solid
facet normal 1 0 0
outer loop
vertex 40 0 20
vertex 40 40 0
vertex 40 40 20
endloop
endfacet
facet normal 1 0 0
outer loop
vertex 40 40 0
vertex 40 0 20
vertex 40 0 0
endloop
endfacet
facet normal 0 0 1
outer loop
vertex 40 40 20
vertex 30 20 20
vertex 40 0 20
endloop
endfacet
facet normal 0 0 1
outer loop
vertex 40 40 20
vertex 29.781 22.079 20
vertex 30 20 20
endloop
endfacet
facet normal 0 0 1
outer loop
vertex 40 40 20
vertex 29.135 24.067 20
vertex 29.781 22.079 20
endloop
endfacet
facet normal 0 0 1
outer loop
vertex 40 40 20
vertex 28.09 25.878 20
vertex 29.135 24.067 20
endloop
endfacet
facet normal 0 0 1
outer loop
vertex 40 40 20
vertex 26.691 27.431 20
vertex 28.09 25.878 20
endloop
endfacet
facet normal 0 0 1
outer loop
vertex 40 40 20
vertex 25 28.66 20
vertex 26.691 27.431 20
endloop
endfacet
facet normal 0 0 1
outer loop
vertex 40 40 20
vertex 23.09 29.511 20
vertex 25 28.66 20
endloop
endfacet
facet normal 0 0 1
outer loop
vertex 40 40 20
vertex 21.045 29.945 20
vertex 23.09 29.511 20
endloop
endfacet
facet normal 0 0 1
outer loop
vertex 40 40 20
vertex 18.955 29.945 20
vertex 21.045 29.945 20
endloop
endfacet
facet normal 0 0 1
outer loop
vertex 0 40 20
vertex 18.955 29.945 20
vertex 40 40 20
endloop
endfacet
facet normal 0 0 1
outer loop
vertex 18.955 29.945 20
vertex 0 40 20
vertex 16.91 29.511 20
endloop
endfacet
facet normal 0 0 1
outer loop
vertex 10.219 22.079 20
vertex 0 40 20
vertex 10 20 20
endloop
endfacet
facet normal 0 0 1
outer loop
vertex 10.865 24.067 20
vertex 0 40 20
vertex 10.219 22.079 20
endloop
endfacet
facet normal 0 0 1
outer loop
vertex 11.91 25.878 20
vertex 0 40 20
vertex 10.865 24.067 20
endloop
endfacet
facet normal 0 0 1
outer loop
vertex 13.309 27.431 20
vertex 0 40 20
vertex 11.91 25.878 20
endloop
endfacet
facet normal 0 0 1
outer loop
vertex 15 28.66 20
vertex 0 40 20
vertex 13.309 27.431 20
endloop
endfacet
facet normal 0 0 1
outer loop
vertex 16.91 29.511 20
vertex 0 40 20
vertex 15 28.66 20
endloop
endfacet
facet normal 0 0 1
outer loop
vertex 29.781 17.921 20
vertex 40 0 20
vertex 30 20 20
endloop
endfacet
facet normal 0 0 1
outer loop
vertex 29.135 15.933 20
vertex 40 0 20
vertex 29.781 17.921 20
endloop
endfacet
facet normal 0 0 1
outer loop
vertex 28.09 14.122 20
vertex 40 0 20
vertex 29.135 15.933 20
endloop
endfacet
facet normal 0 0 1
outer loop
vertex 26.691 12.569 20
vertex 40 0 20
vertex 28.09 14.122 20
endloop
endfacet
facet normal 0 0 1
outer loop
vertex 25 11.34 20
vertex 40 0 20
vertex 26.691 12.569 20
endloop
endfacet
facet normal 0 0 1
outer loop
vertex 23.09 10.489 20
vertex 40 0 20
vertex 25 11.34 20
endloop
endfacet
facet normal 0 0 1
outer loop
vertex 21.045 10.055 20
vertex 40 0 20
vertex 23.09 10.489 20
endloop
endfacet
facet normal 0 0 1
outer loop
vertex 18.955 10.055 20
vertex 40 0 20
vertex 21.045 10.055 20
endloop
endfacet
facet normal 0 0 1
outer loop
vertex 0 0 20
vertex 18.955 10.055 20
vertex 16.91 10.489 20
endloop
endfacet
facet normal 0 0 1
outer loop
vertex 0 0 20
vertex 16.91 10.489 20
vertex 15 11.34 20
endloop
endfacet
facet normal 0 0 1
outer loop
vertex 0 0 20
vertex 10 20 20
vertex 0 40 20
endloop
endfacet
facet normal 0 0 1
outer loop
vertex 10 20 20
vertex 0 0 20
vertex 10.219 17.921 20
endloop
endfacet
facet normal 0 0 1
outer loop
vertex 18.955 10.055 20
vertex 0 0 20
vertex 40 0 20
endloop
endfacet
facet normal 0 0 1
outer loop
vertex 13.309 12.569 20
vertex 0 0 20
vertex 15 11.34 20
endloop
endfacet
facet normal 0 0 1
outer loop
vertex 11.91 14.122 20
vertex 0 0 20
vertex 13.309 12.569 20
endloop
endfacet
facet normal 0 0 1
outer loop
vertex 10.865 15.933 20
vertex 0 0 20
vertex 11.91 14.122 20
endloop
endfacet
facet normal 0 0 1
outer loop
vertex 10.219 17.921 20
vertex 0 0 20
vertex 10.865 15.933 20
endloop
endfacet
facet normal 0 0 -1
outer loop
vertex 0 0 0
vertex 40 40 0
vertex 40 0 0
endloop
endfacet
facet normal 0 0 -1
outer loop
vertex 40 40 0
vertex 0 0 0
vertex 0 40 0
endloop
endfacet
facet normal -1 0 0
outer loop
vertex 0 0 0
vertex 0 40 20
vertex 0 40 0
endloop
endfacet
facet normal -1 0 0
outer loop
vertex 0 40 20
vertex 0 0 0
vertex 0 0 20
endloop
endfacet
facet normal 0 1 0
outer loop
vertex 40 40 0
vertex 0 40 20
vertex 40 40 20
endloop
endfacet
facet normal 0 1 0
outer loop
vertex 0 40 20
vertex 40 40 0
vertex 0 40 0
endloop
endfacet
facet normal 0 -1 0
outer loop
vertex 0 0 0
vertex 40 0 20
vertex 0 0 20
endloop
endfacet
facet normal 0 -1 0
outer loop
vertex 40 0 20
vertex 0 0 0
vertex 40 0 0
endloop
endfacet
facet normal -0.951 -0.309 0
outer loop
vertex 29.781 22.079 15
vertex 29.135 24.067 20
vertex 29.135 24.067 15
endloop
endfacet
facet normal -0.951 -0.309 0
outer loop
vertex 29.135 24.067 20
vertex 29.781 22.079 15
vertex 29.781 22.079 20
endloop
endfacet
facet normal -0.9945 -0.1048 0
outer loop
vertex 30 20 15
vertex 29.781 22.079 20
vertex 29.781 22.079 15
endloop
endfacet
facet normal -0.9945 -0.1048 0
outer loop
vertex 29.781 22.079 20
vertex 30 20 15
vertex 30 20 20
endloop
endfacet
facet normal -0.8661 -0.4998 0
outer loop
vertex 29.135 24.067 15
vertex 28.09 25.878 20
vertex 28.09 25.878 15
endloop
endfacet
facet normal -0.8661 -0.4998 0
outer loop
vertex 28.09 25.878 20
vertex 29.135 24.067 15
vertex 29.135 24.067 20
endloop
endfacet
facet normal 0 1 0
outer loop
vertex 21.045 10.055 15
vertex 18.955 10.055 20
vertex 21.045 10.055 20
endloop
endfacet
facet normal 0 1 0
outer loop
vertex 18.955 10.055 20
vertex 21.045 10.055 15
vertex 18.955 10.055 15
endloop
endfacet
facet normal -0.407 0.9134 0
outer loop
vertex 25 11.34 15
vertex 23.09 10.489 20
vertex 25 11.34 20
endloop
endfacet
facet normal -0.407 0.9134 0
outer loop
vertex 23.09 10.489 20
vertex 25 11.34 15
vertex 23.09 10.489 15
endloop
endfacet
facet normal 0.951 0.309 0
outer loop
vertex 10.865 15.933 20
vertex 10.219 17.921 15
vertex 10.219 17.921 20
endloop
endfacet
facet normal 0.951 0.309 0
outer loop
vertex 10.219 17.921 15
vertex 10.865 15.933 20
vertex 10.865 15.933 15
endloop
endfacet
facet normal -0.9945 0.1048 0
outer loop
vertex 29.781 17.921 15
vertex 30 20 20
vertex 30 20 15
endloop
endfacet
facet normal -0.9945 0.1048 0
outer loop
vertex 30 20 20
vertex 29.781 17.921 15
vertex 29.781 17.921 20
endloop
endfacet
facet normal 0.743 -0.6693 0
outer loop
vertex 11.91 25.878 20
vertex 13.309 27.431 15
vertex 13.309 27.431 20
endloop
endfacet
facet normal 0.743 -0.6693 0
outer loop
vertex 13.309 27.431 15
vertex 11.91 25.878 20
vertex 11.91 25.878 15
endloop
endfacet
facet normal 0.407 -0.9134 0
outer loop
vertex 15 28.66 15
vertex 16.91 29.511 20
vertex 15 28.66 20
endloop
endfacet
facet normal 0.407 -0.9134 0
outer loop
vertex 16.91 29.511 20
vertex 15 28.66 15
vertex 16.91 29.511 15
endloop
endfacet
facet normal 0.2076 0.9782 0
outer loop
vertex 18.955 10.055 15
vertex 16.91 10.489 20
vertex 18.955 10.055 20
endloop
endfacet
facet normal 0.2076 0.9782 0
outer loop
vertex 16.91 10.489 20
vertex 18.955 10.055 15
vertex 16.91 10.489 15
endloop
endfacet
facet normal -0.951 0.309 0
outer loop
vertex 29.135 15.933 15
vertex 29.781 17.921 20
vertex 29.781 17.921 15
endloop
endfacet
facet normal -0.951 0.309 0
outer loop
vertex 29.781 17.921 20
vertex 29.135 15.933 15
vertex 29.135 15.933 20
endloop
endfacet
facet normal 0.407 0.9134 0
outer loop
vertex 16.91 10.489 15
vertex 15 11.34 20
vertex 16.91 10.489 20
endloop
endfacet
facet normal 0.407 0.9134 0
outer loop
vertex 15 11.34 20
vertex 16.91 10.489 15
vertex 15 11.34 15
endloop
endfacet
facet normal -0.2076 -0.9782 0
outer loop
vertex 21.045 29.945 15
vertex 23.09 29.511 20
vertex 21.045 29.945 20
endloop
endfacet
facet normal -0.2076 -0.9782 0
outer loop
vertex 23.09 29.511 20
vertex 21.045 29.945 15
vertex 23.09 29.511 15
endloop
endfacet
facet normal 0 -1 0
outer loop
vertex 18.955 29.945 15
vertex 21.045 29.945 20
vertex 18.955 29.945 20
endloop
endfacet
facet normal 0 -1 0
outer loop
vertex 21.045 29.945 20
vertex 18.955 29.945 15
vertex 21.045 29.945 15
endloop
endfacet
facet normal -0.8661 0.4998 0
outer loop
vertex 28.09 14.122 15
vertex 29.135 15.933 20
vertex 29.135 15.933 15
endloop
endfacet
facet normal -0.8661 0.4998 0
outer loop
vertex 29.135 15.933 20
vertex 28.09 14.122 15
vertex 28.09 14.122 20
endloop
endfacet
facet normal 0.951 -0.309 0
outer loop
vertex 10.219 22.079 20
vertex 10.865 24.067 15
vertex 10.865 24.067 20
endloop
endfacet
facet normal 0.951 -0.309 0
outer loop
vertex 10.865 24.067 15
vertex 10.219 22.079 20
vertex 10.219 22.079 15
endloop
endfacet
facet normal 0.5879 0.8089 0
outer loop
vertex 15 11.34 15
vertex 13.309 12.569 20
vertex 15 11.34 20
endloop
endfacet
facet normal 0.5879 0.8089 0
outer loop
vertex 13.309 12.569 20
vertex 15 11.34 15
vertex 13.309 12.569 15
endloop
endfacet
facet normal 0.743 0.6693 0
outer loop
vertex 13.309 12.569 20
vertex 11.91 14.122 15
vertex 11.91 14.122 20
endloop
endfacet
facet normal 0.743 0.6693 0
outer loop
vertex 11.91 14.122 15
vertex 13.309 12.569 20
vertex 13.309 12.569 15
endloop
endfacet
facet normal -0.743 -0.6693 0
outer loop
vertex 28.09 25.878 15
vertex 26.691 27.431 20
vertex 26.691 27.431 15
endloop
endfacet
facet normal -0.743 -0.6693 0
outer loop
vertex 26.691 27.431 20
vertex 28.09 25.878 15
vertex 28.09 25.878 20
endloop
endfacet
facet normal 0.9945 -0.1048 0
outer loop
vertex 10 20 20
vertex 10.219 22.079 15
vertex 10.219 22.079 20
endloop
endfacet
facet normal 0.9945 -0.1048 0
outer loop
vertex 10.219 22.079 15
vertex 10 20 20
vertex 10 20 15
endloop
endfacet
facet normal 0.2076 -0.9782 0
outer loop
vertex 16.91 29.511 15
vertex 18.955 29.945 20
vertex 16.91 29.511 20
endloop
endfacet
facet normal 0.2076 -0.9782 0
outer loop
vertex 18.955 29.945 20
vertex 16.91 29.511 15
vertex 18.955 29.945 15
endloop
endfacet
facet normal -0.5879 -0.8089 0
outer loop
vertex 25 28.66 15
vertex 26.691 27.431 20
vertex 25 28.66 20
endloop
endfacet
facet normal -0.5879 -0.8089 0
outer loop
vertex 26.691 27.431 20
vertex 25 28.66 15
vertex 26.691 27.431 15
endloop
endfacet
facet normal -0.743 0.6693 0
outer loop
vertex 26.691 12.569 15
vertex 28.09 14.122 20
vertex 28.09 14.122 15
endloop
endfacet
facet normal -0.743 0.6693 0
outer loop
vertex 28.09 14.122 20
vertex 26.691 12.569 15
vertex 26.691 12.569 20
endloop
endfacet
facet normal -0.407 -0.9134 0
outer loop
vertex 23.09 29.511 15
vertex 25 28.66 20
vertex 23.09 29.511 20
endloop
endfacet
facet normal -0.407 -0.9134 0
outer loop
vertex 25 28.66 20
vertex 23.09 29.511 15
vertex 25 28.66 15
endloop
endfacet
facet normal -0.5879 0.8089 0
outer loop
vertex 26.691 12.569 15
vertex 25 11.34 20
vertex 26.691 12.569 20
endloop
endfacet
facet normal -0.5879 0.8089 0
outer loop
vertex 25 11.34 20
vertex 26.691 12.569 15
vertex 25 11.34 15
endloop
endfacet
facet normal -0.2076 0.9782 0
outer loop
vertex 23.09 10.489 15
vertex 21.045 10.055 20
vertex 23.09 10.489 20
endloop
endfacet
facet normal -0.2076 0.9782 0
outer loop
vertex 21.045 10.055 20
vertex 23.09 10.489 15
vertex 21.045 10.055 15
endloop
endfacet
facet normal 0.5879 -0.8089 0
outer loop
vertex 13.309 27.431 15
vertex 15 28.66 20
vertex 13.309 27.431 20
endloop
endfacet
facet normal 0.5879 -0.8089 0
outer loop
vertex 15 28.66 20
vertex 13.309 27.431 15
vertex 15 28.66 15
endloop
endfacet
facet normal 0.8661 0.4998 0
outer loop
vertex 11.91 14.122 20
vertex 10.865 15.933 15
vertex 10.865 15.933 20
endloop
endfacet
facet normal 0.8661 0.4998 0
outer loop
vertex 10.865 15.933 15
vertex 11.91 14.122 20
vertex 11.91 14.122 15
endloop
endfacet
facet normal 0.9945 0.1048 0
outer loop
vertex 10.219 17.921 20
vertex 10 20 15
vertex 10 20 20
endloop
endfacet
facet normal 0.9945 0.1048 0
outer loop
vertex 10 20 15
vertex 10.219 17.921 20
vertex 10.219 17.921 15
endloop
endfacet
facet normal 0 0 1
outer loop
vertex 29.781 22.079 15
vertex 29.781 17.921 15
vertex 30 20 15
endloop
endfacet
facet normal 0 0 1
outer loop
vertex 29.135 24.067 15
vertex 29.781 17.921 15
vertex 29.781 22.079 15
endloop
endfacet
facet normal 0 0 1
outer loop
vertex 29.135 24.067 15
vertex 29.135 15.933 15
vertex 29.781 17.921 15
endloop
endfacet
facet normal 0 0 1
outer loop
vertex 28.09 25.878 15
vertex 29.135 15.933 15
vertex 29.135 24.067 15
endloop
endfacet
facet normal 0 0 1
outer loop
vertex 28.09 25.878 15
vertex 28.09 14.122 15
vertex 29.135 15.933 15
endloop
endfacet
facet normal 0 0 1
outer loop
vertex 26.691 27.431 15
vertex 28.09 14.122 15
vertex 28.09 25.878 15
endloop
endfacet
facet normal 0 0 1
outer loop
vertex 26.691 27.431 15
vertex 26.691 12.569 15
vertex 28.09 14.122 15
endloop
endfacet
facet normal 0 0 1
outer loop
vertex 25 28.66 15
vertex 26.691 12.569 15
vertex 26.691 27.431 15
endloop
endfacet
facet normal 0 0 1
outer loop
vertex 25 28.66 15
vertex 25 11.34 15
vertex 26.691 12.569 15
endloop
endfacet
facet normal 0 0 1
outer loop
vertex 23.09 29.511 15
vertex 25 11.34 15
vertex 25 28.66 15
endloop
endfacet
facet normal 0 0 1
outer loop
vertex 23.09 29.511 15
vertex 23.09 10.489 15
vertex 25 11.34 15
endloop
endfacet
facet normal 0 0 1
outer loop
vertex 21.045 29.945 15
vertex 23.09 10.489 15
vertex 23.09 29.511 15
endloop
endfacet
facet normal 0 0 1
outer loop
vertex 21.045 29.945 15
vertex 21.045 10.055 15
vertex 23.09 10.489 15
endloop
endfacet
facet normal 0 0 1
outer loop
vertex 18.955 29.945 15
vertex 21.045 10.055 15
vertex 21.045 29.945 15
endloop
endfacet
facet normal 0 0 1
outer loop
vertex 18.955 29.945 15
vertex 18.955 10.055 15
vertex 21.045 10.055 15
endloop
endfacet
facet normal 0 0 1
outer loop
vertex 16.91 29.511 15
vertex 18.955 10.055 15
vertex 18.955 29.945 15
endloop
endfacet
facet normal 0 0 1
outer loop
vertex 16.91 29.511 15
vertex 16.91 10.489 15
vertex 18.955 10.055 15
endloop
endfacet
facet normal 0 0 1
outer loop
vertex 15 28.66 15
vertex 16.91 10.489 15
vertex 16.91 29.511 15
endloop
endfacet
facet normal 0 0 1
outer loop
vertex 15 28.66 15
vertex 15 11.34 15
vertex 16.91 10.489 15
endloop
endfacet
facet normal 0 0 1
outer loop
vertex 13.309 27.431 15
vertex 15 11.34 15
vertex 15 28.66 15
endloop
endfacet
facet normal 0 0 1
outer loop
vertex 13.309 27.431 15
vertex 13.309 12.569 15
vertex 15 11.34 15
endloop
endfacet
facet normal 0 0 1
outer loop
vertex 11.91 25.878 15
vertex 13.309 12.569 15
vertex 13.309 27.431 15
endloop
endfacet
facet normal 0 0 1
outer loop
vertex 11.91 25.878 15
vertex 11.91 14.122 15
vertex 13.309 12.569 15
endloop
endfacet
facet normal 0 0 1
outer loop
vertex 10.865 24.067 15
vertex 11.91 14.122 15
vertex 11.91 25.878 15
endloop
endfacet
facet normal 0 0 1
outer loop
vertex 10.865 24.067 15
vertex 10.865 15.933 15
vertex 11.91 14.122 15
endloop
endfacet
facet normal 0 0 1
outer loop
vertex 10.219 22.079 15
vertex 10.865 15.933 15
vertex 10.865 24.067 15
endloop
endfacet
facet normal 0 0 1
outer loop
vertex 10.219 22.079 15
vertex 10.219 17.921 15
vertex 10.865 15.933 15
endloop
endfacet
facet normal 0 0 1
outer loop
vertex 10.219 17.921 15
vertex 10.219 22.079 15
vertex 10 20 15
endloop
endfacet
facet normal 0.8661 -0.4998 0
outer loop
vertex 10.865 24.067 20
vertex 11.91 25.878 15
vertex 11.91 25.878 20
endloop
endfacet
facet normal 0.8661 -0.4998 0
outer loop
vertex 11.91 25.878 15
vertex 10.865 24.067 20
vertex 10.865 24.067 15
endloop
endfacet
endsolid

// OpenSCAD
size = 40;
height = 20;

difference() {
	cube([size, size, height]);
	translate([size / 2, size / 2, height - 5]) {
		cylinder(r=10, h=6);
	}
}
